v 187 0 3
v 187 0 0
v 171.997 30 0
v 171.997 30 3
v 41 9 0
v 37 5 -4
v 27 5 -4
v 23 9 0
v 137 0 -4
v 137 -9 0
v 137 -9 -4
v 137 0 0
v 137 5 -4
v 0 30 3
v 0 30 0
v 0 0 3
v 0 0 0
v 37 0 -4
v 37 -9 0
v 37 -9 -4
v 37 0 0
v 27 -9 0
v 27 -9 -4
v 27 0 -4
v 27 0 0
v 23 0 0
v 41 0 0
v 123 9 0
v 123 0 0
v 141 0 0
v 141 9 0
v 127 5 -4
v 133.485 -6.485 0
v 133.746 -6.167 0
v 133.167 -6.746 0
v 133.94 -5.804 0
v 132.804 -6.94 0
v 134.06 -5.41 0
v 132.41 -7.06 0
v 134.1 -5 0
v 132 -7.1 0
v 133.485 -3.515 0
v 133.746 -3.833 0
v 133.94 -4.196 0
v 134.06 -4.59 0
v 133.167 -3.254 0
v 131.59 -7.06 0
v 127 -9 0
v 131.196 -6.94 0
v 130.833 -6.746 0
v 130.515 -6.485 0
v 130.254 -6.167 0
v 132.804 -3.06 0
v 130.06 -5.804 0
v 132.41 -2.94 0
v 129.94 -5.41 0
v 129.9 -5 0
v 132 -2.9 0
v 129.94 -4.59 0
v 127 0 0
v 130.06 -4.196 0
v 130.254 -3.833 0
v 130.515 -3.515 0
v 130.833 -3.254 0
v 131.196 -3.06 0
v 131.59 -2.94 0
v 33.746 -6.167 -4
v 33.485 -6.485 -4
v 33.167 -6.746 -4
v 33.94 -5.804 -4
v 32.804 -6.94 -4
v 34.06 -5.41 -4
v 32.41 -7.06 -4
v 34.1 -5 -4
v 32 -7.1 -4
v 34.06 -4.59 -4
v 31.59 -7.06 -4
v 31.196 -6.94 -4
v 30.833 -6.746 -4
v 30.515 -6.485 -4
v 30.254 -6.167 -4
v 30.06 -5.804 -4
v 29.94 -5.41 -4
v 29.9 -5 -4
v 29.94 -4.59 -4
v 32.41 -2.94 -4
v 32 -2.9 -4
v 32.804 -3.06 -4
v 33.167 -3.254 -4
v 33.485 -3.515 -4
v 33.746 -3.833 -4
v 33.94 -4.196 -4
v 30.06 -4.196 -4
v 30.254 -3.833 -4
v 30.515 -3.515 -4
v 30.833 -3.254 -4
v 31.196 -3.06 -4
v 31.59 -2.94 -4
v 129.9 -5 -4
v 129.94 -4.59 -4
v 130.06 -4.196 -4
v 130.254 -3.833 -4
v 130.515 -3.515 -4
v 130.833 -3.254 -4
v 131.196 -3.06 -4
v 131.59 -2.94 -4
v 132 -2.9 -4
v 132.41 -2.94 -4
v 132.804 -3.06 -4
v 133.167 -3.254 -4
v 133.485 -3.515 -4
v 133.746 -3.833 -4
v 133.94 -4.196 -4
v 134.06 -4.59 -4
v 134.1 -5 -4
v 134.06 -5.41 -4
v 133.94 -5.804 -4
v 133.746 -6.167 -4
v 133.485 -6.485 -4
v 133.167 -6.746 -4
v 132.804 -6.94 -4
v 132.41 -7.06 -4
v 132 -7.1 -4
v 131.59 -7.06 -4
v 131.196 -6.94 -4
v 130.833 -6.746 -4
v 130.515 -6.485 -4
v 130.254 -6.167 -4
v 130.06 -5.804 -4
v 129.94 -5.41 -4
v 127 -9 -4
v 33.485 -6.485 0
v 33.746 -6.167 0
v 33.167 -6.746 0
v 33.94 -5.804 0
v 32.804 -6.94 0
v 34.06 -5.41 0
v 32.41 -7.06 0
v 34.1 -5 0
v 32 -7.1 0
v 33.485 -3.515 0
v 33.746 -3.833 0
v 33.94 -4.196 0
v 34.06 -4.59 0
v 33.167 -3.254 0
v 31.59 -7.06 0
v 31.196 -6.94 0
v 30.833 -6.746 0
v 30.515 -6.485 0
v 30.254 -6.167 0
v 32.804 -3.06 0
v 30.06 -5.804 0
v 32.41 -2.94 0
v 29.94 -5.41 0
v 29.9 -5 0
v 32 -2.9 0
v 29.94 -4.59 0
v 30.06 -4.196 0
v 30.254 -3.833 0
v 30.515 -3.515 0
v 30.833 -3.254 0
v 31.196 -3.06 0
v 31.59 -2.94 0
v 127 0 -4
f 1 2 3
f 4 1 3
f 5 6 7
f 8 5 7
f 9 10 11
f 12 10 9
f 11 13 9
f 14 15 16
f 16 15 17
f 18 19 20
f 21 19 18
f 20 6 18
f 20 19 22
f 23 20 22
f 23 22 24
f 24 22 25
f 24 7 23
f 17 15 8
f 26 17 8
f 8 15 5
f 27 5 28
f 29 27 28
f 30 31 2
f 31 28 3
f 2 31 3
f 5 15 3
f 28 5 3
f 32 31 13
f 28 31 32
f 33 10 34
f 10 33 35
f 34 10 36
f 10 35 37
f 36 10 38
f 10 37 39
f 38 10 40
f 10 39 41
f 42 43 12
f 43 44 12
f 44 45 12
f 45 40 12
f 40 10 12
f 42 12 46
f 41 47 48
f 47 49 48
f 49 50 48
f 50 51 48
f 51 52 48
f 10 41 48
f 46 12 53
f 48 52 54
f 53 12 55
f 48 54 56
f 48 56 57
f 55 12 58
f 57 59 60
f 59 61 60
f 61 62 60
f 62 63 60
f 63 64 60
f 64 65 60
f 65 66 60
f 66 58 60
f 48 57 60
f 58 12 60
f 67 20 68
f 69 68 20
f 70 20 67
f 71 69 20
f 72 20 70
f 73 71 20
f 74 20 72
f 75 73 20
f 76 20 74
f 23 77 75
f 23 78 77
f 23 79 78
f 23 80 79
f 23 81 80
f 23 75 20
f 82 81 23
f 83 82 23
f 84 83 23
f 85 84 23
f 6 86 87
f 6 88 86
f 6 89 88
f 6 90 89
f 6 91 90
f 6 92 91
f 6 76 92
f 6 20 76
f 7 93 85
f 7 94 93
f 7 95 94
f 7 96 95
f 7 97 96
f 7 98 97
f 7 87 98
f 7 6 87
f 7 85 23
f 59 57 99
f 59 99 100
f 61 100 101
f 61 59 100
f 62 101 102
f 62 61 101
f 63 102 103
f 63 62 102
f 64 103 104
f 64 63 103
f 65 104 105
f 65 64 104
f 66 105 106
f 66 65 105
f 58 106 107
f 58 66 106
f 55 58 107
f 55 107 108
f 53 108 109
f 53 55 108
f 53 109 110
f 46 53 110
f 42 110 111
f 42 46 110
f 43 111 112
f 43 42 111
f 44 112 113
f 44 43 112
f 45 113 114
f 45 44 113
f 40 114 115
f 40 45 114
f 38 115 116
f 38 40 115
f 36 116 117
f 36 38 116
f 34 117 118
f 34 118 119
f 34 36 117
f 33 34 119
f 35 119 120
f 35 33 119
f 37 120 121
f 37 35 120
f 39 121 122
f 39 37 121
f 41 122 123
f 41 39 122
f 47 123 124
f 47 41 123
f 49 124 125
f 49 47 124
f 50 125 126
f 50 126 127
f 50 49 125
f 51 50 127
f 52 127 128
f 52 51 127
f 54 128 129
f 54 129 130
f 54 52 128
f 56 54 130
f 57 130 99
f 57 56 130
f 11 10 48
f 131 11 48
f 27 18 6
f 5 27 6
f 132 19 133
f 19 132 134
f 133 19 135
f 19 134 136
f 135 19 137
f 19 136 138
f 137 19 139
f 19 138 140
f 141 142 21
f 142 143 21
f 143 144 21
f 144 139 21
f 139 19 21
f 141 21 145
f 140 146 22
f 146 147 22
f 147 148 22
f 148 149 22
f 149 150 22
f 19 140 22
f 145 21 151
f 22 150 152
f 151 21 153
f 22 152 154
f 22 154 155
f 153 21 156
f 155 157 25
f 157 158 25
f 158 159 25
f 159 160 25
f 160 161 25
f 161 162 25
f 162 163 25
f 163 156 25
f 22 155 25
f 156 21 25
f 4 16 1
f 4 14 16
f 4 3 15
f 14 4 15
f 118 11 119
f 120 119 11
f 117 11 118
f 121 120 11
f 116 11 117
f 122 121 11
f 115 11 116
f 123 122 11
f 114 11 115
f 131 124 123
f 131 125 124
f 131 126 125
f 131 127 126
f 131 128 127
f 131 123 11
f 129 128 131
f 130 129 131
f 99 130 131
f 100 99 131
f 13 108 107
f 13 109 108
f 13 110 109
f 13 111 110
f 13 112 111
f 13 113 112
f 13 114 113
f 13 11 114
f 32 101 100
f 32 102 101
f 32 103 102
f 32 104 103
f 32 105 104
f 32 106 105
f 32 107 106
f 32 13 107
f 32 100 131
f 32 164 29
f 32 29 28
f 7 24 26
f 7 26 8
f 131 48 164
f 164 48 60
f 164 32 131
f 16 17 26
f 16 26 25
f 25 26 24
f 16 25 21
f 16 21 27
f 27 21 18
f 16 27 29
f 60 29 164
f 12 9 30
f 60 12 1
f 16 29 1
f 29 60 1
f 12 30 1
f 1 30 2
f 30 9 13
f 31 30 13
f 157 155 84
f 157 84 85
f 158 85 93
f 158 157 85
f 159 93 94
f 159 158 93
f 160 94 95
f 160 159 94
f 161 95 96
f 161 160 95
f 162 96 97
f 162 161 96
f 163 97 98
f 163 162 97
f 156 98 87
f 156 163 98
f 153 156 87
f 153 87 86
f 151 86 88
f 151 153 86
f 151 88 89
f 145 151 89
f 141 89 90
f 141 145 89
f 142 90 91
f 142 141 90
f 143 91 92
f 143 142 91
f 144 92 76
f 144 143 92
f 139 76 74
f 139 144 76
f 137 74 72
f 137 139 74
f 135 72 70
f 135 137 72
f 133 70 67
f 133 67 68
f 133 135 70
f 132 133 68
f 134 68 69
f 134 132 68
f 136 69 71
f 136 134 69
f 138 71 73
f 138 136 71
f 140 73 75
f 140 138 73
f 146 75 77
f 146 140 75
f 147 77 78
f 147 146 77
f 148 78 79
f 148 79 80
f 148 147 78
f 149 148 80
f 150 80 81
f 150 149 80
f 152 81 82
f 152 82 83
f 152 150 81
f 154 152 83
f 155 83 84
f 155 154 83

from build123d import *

# Parameters (mm, degrees)
DODANIE_WYCI_GNI_CIE1_DEPTH = 3
SZKIC2_W                    = 10
SZKIC2_H                    = 14
SZKIC2_R                    = 2.1
DODANIE_WYCI_GNI_CIE2_DEPTH = 4
SFAZOWANIE1_SIZE            = 4


with BuildPart() as part:
    # Szkic1 → Dodanie-wyciągnięcie1 (new body)
    with BuildSketch(Plane.XY):
        Polygon((0, 0), (187, 0), (171.996760863, 30), (0, 30), align=None)
    extrude(amount=DODANIE_WYCI_GNI_CIE1_DEPTH)

    # Szkic2 → Dodanie-wyciągnięcie2 (add)
    # profile 1 of 2: a face of its own
    with BuildSketch(Plane(origin=(0, 0, 0), x_dir=(-1, 0, 0), z_dir=(0, 0, -1))):
        with Locations((-132, -2)):
            Rectangle(SZKIC2_W, SZKIC2_H)
        with Locations((-132, -5)):
            Circle(SZKIC2_R, mode=Mode.SUBTRACT)
    # profile 2 of 2: a face of its own
    with BuildSketch(Plane(origin=(0, 0, 0), x_dir=(-1, 0, 0), z_dir=(0, 0, -1))):
        with Locations((-32, -2)):
            Rectangle(SZKIC2_W, SZKIC2_H)
        with Locations((-32, -5)):
            Circle(SZKIC2_R, mode=Mode.SUBTRACT)
    extrude(amount=DODANIE_WYCI_GNI_CIE2_DEPTH)

    # Sfazowanie1
    sfazowanie1_edges = [part.edges().sort_by_distance(p)[0] for p in [
        (37, 2.5, 0),
        (32, 5, 0),
        (27, 2.5, 0),
        (127, 2.5, 0),
        (132, 5, 0),
        (137, 2.5, 0),
    ]]
    chamfer(sfazowanie1_edges, length=SFAZOWANIE1_SIZE - 0.0001)  # a hair under: the kernel refuses the full size


solid = part.part
